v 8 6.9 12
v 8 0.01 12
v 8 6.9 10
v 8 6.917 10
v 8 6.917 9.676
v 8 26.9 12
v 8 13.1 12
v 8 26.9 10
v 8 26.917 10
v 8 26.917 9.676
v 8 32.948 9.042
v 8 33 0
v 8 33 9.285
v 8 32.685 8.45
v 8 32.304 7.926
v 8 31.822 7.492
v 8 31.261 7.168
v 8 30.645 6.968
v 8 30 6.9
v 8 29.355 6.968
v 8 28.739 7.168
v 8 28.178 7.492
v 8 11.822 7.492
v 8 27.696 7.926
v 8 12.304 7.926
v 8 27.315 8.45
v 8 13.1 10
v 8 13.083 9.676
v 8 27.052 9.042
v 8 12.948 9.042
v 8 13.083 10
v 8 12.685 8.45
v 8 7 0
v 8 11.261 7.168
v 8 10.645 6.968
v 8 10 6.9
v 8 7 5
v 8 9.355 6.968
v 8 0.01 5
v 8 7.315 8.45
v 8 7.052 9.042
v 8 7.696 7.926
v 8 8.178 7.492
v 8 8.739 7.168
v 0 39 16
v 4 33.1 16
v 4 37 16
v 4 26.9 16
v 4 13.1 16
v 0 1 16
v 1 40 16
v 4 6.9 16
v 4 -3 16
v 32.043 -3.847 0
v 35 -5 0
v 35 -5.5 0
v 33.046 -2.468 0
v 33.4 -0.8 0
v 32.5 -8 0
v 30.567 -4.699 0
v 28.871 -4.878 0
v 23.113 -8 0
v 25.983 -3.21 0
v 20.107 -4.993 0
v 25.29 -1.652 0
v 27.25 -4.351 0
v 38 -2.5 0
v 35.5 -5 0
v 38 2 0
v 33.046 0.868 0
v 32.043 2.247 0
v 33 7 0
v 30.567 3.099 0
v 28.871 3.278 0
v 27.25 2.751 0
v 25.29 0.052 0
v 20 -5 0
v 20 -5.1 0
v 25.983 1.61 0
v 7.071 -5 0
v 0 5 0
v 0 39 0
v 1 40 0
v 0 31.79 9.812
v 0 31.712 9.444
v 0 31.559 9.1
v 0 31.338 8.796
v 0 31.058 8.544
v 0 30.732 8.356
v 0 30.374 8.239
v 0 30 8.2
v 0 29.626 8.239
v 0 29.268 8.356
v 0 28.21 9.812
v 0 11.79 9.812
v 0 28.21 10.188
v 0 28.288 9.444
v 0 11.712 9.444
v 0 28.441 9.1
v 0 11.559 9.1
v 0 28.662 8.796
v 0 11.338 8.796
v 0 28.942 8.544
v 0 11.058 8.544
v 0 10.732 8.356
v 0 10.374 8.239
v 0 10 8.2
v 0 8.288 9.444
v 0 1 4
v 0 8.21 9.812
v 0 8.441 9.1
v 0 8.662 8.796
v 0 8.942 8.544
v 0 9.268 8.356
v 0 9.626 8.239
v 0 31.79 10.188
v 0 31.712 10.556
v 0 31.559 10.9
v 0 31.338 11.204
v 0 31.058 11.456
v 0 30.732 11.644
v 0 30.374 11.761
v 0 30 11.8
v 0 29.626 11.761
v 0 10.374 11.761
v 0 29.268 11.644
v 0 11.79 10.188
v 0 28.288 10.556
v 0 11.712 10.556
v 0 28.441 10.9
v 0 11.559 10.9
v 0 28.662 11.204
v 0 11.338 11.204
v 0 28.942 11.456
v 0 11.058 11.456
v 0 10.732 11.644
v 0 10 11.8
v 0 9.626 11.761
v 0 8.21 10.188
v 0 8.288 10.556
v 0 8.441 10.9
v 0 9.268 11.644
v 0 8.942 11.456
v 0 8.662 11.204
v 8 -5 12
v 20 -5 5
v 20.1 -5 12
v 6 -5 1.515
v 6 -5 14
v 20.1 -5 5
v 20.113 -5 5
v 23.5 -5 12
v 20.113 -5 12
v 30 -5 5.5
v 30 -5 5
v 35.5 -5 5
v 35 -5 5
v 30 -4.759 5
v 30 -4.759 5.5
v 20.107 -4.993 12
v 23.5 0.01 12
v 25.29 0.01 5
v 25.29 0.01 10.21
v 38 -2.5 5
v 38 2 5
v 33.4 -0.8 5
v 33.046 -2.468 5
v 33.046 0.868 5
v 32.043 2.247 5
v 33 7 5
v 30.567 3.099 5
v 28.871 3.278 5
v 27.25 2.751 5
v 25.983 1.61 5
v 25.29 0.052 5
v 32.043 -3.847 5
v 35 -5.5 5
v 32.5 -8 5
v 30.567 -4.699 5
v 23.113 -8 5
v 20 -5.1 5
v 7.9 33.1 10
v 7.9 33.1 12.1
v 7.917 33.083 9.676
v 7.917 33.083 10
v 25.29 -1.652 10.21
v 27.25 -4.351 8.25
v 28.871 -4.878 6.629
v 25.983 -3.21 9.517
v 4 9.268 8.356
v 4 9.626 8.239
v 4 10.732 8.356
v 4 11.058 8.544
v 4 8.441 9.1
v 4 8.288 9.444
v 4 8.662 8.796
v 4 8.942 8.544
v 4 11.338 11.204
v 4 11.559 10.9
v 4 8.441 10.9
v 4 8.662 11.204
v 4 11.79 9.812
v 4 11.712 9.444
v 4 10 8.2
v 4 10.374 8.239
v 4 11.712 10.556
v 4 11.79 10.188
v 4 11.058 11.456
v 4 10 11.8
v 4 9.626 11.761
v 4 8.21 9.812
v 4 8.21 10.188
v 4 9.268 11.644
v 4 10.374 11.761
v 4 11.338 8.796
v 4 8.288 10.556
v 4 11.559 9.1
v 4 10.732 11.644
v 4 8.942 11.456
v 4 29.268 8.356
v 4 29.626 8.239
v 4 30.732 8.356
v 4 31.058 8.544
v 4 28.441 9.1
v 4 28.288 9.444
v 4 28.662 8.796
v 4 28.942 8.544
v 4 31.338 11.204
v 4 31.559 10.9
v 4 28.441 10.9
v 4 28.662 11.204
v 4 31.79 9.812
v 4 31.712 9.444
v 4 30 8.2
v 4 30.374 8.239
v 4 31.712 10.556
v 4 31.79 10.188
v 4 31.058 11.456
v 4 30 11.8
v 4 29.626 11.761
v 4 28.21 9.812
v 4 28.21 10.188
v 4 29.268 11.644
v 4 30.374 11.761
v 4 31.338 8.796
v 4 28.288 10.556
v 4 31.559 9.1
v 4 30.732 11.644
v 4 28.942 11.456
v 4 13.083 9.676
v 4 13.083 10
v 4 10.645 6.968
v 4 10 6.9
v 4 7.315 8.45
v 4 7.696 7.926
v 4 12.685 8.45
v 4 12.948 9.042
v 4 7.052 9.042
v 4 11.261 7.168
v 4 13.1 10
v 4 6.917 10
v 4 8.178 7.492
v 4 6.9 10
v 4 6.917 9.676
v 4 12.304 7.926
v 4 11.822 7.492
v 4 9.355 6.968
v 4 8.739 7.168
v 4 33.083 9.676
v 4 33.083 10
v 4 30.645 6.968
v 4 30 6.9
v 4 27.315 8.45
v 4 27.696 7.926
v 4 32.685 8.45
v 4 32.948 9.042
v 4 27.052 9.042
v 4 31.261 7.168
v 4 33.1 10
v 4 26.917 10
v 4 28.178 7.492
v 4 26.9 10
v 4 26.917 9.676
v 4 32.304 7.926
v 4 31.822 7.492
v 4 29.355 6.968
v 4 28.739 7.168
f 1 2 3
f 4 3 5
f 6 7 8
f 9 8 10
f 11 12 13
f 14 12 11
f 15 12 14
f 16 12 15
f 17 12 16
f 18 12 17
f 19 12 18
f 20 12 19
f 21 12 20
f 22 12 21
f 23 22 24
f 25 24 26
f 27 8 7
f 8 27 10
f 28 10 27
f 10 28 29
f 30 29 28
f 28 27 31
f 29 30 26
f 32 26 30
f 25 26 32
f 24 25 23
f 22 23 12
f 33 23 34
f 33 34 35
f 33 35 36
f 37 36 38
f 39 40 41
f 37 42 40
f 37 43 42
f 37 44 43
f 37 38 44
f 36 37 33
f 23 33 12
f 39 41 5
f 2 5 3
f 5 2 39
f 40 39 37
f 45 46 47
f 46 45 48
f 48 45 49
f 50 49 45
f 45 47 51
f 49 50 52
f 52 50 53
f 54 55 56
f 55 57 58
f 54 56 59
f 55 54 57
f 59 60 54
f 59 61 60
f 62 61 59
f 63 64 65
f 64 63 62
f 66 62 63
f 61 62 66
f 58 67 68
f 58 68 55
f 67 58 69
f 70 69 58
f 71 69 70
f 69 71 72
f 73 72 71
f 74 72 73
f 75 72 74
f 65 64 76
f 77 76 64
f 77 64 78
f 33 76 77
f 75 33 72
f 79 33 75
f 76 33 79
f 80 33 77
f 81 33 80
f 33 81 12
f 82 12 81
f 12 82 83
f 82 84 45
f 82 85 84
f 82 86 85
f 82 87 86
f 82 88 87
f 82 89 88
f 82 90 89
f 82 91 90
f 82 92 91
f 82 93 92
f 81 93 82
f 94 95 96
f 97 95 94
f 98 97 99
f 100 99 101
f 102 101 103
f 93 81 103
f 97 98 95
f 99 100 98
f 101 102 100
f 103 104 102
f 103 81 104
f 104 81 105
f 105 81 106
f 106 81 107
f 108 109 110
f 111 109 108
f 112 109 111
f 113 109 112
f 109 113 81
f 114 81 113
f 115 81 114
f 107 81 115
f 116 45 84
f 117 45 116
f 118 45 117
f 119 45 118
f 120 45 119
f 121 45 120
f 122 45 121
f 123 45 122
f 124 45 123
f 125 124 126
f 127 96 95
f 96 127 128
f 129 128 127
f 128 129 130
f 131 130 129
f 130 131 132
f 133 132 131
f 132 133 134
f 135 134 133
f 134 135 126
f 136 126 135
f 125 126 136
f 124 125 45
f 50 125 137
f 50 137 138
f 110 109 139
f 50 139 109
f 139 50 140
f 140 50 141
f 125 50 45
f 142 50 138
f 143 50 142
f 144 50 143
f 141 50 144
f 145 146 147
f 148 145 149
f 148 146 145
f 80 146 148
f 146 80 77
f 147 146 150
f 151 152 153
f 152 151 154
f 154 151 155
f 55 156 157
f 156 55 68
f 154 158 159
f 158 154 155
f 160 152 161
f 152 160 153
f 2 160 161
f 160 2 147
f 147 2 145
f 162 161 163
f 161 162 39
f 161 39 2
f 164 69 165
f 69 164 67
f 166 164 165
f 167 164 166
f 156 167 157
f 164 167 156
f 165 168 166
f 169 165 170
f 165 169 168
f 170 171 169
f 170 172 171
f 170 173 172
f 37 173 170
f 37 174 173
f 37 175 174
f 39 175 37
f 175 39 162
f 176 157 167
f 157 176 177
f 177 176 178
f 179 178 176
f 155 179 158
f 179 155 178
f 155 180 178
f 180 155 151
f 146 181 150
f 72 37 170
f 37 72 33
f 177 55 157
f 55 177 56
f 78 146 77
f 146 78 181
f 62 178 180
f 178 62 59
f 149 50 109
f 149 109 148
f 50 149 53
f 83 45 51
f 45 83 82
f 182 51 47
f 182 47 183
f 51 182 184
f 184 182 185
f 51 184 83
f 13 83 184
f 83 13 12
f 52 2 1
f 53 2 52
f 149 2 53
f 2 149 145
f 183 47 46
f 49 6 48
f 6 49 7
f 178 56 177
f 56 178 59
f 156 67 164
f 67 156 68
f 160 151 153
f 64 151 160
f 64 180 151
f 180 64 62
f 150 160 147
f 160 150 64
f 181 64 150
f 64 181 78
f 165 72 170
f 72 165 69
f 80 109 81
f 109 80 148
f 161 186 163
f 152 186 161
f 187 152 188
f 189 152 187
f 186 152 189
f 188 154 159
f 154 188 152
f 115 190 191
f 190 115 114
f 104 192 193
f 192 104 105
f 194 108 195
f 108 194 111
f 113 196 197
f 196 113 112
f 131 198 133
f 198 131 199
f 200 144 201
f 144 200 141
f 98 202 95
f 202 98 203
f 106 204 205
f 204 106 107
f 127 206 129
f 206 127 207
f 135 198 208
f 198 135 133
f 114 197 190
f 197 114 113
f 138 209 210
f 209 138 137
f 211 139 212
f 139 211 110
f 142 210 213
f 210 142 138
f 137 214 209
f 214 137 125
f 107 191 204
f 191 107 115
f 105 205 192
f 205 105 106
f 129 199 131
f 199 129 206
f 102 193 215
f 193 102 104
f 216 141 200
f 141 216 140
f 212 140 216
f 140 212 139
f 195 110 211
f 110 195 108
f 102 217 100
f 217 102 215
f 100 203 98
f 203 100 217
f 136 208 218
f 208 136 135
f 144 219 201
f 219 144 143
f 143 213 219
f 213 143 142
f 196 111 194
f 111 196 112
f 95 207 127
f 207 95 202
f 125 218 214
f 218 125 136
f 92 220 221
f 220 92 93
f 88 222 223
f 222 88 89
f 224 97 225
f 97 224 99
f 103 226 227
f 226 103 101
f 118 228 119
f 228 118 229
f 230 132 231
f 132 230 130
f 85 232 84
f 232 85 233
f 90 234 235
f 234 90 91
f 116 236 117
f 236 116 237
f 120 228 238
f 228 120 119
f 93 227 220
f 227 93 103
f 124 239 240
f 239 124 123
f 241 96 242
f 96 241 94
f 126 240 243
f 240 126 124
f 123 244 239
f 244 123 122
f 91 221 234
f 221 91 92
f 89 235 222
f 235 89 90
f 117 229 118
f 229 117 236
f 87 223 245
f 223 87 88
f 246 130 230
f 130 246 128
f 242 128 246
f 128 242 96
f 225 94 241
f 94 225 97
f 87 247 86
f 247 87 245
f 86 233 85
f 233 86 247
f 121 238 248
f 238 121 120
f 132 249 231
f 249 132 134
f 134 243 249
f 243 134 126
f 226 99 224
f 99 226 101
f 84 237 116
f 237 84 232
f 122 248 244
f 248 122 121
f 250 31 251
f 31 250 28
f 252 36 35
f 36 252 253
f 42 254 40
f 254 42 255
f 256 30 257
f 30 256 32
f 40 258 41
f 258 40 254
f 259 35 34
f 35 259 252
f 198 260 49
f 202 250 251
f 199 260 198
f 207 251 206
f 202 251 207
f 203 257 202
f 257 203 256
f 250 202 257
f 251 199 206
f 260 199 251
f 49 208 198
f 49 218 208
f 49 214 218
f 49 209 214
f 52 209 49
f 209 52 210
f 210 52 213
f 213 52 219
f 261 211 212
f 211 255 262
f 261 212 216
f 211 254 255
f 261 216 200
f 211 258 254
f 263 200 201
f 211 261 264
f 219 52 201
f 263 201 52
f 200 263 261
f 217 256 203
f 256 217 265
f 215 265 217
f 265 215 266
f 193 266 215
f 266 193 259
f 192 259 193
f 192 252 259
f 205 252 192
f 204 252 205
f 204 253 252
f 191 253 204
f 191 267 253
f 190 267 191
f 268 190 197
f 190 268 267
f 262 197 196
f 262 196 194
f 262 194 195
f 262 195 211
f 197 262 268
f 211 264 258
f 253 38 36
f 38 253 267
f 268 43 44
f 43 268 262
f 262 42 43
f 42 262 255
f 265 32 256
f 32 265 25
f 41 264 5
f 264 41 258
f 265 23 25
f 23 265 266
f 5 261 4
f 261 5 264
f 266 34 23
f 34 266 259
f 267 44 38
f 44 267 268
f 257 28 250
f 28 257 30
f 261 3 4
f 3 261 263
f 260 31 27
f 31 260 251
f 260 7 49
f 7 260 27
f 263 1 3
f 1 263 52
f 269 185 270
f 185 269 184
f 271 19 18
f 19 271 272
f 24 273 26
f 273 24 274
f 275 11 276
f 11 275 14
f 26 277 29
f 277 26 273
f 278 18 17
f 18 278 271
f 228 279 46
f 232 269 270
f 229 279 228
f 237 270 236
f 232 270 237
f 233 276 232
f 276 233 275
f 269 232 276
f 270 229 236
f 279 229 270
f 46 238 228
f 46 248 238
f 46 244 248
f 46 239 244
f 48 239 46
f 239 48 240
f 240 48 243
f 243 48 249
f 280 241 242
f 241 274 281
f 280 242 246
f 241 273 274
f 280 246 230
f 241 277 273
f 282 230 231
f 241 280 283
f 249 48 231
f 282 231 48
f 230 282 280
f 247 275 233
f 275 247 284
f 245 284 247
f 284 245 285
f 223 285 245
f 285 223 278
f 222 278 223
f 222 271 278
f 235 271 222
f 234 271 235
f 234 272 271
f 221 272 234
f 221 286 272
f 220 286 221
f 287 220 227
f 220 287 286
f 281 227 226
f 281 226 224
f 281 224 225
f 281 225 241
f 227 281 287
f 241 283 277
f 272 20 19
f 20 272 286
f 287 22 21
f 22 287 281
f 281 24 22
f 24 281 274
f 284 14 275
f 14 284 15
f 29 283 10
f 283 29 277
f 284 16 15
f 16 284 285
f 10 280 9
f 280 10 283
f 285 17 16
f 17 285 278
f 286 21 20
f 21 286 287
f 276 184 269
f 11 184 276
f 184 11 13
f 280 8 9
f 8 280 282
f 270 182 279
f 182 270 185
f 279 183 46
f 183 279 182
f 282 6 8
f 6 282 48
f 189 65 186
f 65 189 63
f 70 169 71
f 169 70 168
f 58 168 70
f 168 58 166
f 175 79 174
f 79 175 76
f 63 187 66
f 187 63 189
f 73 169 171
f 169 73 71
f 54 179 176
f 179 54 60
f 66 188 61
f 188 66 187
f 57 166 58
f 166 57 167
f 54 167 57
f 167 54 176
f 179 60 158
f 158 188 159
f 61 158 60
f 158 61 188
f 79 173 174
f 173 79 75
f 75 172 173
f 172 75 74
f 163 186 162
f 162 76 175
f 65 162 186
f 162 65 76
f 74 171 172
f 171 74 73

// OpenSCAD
// PRUSA iteration3
// Z axis top holder
// GNU GPL v3
// Josef Průša <iam@josefprusa.cz> and contributors
// http://www.reprap.org/wiki/Prusa_Mendel
// http://prusamendel.org

module z_top_base(){
 translate([0,-5,0]) cube([8,45,16]); // plate touching the base
 translate([0,-5,0]) cube([30,5.01,12]); // plate touching the base
 translate([0,-5,0]) cube([38,12,5]);
 translate([20,-8,0]) cube([15,12,5]); // plate touching the base
}

module z_top_fancy(){
 // Corner cutouts
 translate([0.5,0.5,0]) rotate([0,0,-45-180]) translate([-15,0,-1]) cube([30,30,51]);
 translate([0.5,40-0.5,0]) rotate([0,0,-45+90]) translate([-15,0,-1]) cube([30,30,51]);
 translate([-4,40+5,0]) rotate([0,0,-45-0]) translate([0,0,-1]) cube([30,30,51]);
 translate([8,0,12]) rotate([0,-45,0]) translate([0,-5,0]) cube([30,50,30]);
 translate([38,-5+2.5,0]) rotate([0,0,-45-90]) translate([-15,0,-1]) cube([30,30,51]);


translate([9.5,-15.6,0]) rotate([0,0,-45-90]) translate([-15,0,-1]) cube([30,30,51]);

 translate([38-1.5-5,10-1.5,0]) rotate([0,0,-45]) translate([-15,0,-1]) cube([30,30,51]);
 translate([0,0,5]) rotate([45+180,0,0]) rotate([0,0,-45+90]) translate([0,0,-15]) cube([30,30,30]);

// Stiffner cut out
 translate([30,0,5.5]) rotate([0,-45,0]) translate([0,-5,0]) cube([30,50,30]);
}

module z_top_holes(){
 // Screw holes
 translate([-1,10,10]) rotate([0,90,0]) cylinder(h = 20, r=1.8, $fn=30);
 translate([-1,10+20,10]) rotate([0,90,0]) cylinder(h = 20, r=1.8, $fn=30);

 // Screw heads
 translate([4,10,10]) rotate([0,90,0]) cylinder(h = 20, r=3.1, $fn=30);
 translate([4,10-3.1,10]) cube([10,6.2,10]);
 translate([4,10+20,10]) rotate([0,90,0]) cylinder(h = 20, r=3.1, $fn=30);
 translate([4,10+20-3.1,10]) cube([10,6.2,10]);

 // Z rod holder
 translate([25+4.3,4.2-5,-1]) rotate([0,0,0]) cylinder(h = 50, r=4.1, $fn=15);
 //translate([25+4.3-1,3,0.6]) cube([2,10,7]); // it's bit up because it helps with printing
}

// Final part
module z_top(){
 difference(){
  z_top_base();
  z_top_fancy();
  z_top_holes();
 }
 *translate([0,-13,0]) mirror([0,1,0]) difference(){
  z_top_base();
  z_top_fancy();
  z_top_holes();
 }
}

z_top();
